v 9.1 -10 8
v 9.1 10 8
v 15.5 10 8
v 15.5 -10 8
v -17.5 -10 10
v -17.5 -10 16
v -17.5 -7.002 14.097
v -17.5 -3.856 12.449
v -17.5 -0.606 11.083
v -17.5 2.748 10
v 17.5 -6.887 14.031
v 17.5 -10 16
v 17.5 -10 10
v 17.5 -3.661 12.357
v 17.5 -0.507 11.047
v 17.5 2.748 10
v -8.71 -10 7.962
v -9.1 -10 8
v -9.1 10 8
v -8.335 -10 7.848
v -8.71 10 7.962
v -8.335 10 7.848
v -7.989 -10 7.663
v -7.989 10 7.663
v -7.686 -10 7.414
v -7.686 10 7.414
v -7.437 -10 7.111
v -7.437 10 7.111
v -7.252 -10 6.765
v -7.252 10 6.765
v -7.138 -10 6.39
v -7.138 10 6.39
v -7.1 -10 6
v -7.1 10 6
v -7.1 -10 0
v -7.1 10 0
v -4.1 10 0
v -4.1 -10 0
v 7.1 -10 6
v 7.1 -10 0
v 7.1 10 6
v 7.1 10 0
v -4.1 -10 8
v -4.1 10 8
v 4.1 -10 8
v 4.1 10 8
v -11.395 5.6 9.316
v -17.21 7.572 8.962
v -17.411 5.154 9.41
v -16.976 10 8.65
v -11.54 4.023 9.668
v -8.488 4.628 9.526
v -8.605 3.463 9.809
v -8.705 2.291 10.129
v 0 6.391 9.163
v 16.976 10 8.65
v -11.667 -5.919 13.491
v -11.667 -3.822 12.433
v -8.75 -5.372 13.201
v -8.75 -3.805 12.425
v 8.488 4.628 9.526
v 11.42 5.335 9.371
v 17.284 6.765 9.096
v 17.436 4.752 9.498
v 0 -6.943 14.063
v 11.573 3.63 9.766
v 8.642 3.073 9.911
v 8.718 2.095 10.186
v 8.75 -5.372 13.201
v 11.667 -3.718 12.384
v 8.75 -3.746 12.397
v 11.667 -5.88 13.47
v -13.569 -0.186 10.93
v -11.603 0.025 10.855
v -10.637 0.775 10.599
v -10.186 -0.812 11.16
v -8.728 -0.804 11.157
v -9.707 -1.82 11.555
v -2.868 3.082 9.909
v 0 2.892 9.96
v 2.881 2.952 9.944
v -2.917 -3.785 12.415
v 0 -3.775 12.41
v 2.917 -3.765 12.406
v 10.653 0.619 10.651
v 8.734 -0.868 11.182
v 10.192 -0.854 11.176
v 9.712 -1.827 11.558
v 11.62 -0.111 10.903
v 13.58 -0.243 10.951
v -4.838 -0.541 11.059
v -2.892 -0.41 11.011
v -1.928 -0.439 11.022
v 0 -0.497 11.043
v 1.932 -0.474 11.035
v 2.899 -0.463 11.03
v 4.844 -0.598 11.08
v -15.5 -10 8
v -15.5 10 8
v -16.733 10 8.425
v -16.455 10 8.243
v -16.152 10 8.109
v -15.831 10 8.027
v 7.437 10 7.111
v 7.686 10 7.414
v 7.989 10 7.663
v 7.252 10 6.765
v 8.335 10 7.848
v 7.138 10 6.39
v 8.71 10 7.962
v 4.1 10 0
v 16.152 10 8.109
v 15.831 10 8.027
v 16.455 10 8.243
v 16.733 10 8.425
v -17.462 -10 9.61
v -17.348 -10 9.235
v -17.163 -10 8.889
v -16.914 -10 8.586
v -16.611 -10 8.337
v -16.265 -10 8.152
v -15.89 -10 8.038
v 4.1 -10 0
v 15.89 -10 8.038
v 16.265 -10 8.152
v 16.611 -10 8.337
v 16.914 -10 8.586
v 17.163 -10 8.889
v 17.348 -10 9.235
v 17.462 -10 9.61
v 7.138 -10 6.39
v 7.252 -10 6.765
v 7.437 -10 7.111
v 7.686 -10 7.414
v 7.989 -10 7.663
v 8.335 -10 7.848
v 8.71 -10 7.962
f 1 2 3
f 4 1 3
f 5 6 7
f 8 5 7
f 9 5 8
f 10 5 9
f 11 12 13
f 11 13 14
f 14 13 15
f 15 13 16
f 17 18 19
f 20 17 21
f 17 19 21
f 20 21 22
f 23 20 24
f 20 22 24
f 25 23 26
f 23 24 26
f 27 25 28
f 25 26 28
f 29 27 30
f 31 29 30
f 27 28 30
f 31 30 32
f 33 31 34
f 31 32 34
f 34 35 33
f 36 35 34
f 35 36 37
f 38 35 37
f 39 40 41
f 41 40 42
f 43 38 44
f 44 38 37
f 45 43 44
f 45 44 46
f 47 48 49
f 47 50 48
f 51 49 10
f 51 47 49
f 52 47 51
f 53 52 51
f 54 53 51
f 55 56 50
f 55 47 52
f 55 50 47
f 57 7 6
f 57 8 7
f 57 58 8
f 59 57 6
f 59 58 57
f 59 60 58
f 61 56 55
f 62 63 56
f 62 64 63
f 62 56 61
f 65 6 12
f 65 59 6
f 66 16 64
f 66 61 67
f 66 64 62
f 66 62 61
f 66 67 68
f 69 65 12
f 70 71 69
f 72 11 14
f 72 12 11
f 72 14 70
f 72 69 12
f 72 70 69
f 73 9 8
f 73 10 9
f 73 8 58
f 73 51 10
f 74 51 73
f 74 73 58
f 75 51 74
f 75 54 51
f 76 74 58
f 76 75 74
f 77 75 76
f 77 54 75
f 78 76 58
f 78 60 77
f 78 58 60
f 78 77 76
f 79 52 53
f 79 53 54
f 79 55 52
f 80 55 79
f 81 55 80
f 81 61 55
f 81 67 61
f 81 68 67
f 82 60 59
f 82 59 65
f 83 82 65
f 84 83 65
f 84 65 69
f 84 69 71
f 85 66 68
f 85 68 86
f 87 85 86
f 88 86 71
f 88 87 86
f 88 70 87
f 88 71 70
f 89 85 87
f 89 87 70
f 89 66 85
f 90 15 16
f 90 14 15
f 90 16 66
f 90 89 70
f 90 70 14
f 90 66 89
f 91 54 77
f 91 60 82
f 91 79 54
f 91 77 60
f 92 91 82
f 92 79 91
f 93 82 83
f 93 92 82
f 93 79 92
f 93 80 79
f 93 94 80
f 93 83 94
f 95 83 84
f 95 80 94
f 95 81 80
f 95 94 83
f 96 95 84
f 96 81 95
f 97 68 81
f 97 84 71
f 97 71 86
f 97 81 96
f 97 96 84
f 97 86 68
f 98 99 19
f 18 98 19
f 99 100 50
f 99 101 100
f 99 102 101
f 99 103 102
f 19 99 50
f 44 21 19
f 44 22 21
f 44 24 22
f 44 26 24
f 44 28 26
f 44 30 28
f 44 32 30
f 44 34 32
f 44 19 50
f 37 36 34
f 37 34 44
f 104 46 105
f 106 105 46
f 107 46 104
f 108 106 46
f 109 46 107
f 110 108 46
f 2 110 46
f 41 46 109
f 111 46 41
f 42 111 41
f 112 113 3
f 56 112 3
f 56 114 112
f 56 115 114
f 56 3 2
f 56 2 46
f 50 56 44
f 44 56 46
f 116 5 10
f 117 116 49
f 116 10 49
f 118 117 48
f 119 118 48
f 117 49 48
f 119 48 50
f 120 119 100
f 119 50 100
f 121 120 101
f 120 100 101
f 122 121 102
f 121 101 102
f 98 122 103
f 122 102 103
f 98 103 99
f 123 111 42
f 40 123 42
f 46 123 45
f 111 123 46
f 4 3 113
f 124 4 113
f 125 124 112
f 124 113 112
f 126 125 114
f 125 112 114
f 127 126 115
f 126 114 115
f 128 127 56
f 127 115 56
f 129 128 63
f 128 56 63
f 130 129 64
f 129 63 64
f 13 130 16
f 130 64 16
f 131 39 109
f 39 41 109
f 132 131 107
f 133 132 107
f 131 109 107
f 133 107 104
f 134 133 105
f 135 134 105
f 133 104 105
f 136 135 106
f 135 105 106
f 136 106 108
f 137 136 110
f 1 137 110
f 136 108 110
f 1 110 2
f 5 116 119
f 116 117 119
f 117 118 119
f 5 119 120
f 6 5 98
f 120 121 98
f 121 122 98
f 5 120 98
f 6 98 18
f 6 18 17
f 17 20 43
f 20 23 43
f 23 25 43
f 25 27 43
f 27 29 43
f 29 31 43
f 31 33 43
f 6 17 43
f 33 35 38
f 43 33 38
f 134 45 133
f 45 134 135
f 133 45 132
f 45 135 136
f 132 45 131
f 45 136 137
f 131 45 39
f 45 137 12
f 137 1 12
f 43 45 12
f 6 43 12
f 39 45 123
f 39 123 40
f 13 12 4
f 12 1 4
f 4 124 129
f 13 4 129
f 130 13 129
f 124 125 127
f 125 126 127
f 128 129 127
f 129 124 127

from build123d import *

# Parameters (mm, degrees)
SKETCH2_W             = 3
SKETCH2_H             = 20
BOSS_EXTRUDE1_DEPTH   = 8
BOSS_EXTRUDE1_2_DEPTH = 8
SKETCH3_W             = 35
SKETCH3_H             = 20
BOSS_EXTRUDE2_DEPTH   = 8
CUT_EXTRUDE1_DEPTH    = 100
FILLET1_R             = 2


with BuildPart() as part:
    # Sketch2 → Boss-Extrude1 (new body)
    with BuildSketch(Plane.XY):
        with Locations((-5.6, 0)):
            Rectangle(SKETCH2_W, SKETCH2_H)
    extrude(amount=BOSS_EXTRUDE1_DEPTH)



with BuildPart() as body_2:
    # Sketch2 → Boss-Extrude1 2 (new body)
    with BuildSketch(Plane.XY):
        with Locations((5.6, 0)):
            Rectangle(SKETCH2_W, SKETCH2_H)
    extrude(amount=BOSS_EXTRUDE1_2_DEPTH)


with BuildPart() as part_1:
    add(part.part)

    add(body_2.part)  # Boss-Extrude2 merges body 2
    # Sketch3 → Boss-Extrude2 (add)
    with BuildSketch(Plane.XY.offset(8)):
        Rectangle(SKETCH3_W, SKETCH3_H)
    extrude(amount=BOSS_EXTRUDE2_DEPTH)

    # Sketch4 → Cut-Extrude1 (cut)
    with BuildSketch(Plane(origin=(17.5, 0, 0), x_dir=(0, 0, -1), z_dir=(1, 0, 0))):
        with BuildLine():
            Line((-8.650350687, 10), (-18.749318475, 11.146699317))
            Line((-18.749318475, 11.146699317), (-17.556068679, -8.149022999))
            Line((-17.556068679, -8.149022999), (-16, -10))
            add(Edge.make_bspline(
                [(-8.650350687, 10), (-9.760639053, -0.993319635), (-16, -10)],
                knots=[0, 0, 0, 1, 1, 1], degree=2))
        make_face()
    extrude(amount=-CUT_EXTRUDE1_DEPTH, mode=Mode.SUBTRACT)

    # Fillet1
    fillet1_edges = [part_1.edges().sort_by_distance(p)[0] for p in [
        (17.5, 0, 8),
        (-17.5, 0, 8),
        (-7.1, 0, 8),
        (7.1, 0, 8),
    ]]
    fillet(fillet1_edges, radius=FILLET1_R)


solid = part_1.part
